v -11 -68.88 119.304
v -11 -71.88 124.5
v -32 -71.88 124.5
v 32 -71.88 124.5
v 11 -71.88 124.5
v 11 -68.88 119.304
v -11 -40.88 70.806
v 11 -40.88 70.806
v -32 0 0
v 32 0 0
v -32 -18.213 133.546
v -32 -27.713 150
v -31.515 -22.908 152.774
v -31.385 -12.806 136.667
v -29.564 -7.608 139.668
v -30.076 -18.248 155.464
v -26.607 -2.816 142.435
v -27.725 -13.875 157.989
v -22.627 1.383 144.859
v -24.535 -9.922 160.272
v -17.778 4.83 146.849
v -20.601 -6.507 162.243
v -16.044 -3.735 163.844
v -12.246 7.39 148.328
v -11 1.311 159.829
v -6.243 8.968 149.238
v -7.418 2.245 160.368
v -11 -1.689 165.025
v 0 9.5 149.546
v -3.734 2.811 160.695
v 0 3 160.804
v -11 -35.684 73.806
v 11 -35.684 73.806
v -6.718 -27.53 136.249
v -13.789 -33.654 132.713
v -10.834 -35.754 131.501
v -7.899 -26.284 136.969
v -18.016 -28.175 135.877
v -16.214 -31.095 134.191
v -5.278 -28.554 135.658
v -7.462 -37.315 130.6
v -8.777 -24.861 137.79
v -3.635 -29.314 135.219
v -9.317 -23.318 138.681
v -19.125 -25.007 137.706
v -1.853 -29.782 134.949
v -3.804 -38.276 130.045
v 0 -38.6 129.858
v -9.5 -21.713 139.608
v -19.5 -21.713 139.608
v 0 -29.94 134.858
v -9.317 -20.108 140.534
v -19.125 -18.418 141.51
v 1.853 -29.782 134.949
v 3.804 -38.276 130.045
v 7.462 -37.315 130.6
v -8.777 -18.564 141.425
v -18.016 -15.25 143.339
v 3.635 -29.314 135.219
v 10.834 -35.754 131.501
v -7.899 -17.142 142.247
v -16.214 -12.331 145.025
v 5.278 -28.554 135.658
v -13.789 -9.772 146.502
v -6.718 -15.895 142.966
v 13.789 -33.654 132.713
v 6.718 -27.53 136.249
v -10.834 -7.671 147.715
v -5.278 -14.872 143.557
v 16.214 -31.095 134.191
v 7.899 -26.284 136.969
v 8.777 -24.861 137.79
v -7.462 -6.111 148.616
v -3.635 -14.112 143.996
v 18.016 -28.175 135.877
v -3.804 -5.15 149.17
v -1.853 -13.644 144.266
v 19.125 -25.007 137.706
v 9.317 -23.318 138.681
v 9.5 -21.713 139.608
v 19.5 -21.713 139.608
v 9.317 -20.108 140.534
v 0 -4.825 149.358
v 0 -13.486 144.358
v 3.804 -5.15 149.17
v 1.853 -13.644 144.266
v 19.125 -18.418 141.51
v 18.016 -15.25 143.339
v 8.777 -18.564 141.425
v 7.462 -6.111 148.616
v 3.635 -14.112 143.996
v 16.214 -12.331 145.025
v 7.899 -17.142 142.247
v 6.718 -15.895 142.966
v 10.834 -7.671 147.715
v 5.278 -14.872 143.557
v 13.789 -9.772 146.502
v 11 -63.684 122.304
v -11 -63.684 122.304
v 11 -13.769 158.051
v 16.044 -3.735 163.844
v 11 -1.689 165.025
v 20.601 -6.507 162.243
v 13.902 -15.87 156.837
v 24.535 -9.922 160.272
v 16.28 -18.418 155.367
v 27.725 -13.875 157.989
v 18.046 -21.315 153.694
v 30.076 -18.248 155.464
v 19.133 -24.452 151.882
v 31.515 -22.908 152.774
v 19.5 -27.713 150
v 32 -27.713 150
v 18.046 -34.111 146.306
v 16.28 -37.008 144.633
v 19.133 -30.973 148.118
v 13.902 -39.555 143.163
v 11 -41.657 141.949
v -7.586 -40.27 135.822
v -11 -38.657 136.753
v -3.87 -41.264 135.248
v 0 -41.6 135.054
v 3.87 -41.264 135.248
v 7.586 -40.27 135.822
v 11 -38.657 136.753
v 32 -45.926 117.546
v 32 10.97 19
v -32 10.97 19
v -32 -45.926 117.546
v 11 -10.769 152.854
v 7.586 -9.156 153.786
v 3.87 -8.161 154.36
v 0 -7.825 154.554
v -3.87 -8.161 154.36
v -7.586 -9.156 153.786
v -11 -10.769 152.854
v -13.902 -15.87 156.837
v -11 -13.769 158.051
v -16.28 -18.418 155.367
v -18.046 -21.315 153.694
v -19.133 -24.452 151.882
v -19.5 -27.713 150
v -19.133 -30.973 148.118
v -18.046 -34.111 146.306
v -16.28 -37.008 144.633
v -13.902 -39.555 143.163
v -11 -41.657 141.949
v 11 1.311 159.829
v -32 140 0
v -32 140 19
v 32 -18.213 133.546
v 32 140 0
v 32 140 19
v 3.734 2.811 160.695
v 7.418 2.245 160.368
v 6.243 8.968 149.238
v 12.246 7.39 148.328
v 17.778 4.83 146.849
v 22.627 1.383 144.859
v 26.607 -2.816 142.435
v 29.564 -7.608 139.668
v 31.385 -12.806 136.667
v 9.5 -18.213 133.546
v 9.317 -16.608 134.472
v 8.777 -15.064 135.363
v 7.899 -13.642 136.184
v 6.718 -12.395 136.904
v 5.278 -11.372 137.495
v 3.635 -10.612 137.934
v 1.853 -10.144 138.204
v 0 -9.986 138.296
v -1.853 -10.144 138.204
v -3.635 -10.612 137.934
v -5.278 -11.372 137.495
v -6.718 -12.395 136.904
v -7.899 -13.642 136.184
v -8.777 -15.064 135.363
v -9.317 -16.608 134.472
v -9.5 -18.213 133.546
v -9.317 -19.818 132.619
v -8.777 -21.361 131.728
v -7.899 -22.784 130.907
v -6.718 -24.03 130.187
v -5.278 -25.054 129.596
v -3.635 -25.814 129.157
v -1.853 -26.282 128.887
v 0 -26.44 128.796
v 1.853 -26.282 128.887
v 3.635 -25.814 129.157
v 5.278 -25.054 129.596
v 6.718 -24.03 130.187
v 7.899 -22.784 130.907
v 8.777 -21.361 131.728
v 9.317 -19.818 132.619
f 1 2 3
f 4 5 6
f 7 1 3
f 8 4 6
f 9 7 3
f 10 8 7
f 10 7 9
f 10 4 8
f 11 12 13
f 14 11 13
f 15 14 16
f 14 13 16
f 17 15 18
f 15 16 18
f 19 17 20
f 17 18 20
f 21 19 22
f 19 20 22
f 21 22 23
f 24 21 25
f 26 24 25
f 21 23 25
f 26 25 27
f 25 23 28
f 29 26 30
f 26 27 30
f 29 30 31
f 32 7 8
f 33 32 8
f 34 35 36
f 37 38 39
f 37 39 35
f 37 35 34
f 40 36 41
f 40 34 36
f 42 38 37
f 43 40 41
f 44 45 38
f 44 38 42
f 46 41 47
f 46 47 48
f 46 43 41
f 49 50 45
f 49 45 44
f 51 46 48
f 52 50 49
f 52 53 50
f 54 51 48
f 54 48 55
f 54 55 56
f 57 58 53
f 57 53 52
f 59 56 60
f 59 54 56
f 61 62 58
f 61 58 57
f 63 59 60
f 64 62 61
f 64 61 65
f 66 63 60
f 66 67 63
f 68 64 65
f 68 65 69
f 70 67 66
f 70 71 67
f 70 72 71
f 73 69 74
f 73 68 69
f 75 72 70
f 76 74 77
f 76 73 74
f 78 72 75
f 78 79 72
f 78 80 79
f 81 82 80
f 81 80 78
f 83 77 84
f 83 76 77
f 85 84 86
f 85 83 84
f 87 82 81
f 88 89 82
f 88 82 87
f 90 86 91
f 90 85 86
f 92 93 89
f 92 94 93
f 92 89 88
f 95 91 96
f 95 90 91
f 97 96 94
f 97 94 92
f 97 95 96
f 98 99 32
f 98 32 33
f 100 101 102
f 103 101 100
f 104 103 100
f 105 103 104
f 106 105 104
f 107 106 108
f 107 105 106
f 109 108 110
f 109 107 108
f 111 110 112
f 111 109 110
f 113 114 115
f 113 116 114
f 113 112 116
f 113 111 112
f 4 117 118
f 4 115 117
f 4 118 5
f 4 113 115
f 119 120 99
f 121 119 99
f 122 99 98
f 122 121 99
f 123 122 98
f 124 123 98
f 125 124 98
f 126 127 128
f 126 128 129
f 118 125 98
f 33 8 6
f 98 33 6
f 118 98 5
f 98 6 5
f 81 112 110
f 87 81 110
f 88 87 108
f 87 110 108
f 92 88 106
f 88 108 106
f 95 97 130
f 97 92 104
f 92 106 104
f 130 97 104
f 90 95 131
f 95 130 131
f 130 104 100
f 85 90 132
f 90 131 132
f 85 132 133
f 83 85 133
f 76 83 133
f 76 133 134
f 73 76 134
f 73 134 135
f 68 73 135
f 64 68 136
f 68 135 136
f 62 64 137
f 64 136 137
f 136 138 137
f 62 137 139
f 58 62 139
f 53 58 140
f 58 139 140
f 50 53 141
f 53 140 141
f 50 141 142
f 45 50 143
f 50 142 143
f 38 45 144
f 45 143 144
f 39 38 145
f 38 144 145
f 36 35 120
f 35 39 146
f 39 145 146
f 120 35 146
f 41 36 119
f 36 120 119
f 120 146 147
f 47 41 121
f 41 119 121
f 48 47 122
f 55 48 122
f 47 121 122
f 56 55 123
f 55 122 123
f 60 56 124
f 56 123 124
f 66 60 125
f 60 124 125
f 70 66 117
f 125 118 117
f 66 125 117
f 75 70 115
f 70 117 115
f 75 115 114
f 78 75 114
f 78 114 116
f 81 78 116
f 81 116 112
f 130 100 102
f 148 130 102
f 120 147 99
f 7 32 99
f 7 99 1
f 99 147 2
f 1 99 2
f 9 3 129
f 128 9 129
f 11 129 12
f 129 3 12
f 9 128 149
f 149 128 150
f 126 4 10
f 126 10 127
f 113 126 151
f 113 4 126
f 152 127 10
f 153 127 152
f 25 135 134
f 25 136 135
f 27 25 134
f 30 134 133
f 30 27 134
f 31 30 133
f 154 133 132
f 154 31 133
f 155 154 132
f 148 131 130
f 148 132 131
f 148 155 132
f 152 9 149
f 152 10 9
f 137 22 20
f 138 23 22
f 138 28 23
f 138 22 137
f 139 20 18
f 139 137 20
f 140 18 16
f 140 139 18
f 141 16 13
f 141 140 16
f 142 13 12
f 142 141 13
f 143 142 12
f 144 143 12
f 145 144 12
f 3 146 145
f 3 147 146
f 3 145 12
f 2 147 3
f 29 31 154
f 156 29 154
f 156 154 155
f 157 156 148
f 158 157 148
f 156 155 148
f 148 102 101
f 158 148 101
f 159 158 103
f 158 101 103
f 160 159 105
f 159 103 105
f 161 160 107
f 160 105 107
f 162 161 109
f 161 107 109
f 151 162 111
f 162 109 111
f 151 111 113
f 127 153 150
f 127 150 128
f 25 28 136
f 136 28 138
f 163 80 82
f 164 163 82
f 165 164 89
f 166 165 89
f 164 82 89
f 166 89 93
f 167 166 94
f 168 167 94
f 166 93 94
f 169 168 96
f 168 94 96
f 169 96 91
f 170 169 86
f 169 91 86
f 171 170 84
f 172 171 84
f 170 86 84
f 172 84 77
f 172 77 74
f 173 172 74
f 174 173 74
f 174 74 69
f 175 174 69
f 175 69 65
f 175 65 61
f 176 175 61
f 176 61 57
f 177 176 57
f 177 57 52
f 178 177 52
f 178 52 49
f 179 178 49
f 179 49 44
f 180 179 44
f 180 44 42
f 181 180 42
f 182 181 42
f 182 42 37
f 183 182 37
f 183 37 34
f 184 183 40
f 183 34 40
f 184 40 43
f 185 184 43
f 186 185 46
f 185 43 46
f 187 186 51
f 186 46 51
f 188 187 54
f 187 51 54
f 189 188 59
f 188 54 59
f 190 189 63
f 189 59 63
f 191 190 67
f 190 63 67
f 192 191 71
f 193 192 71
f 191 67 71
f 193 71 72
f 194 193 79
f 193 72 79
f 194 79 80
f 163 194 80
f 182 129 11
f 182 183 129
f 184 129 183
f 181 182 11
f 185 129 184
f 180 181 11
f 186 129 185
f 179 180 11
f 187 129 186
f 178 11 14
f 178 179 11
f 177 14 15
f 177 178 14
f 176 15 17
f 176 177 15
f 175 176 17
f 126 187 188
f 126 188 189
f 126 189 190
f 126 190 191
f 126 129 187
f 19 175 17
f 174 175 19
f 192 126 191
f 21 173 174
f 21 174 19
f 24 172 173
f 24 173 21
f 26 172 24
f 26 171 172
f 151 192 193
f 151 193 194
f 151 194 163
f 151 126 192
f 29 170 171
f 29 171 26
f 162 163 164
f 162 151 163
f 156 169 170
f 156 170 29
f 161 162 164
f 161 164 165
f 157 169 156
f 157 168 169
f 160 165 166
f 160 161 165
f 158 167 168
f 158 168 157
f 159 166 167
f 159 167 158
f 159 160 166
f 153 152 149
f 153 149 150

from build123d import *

# Parameters (mm, degrees)
F1_DEPTH = 32
F2_R     = 9.5
F3_DEPTH = 19
F2_R_2   = 19.5
F4_DEPTH = 12
F6_DEPTH = 6
F7_W     = 22
F7_H     = 56
F8_DEPTH = 6


with BuildPart() as f1:
    # F0 (on Right) → F1 (new body, symmetric)
    with BuildSketch(Plane.YZ):
        Polygon((0, 0), (140, 0), (140, 19), (10.9696551146, 19), (-45.9256258422, 117.5455173281), (9.5, 149.5455173281), (0, 166), (-71.8801085141, 124.5), align=None)
    extrude(amount=F1_DEPTH, both=True)

    # F2 (on face) → F3 (cut, through all)
    with BuildSketch(Plane(origin=(0, -71.8801085141, 124.5), x_dir=(1, 0, 0), z_dir=(0, -0.5, 0.8660254038))):
        with BuildLine():
            ThreePointArc((2.022e-07, 83), (22.6274170695, 73.6274169265), (32, 51))
            Line((32, 51), (32, 83))
            Line((32, 83), (2.022e-07, 83))
        make_face()
        with BuildLine():
            ThreePointArc((-32, 51), (-22.6274169265, 73.6274170695), (2.022e-07, 83))
            Line((2.022e-07, 83), (-32, 83))
            Line((-32, 83), (-32, 51))
        make_face()
        with Locations((0, 51)):
            Circle(F2_R)
    extrude(amount=-F3_DEPTH, mode=Mode.SUBTRACT)

    # F2 (on face) → F4 (cut)
    with BuildSketch(Plane(origin=(0, -71.8801085141, 124.5), x_dir=(1, 0, 0), z_dir=(0, -0.5, 0.8660254038))):
        with Locations((0, 51)):
            Circle(F2_R_2)
        with Locations((0, 51)):
            Circle(F2_R, mode=Mode.SUBTRACT)
    extrude(amount=-F4_DEPTH, mode=Mode.SUBTRACT)

    # F5 (on face) → F6 (cut)
    with BuildSketch(Plane(origin=(0, -71.8801085141, 124.5), x_dir=(1, 0, 0), z_dir=(0, -0.5, 0.8660254038))):
        with BuildLine():
            Line((-11, 0), (11, 0))
            Line((11, 0), (11, 20.9500415974))
            ThreePointArc((11, 20.9500415974), (0, 19), (-11, 20.9500415974))
            Line((-11, 20.9500415974), (-11, 0))
        make_face()
        with BuildLine():
            ThreePointArc((-11, 20.9500415974), (0, 19), (11, 20.9500415974))
            Line((11, 20.9500415974), (11, 83))
            Line((11, 83), (-11, 83))
            Line((-11, 83), (-11, 20.9500415974))
        make_face()
    extrude(amount=-F6_DEPTH, mode=Mode.SUBTRACT)

    # F7 (on face) → F8 (cut)
    with BuildSketch(Plane(origin=(0, 0, 0), x_dir=(1, 0, 0), z_dir=(0, -0.8660254038, -0.5))):
        with Locations((0, 109.7602170282)):
            Rectangle(F7_W, F7_H)
    extrude(amount=-F8_DEPTH, mode=Mode.SUBTRACT)


solid = f1.part
